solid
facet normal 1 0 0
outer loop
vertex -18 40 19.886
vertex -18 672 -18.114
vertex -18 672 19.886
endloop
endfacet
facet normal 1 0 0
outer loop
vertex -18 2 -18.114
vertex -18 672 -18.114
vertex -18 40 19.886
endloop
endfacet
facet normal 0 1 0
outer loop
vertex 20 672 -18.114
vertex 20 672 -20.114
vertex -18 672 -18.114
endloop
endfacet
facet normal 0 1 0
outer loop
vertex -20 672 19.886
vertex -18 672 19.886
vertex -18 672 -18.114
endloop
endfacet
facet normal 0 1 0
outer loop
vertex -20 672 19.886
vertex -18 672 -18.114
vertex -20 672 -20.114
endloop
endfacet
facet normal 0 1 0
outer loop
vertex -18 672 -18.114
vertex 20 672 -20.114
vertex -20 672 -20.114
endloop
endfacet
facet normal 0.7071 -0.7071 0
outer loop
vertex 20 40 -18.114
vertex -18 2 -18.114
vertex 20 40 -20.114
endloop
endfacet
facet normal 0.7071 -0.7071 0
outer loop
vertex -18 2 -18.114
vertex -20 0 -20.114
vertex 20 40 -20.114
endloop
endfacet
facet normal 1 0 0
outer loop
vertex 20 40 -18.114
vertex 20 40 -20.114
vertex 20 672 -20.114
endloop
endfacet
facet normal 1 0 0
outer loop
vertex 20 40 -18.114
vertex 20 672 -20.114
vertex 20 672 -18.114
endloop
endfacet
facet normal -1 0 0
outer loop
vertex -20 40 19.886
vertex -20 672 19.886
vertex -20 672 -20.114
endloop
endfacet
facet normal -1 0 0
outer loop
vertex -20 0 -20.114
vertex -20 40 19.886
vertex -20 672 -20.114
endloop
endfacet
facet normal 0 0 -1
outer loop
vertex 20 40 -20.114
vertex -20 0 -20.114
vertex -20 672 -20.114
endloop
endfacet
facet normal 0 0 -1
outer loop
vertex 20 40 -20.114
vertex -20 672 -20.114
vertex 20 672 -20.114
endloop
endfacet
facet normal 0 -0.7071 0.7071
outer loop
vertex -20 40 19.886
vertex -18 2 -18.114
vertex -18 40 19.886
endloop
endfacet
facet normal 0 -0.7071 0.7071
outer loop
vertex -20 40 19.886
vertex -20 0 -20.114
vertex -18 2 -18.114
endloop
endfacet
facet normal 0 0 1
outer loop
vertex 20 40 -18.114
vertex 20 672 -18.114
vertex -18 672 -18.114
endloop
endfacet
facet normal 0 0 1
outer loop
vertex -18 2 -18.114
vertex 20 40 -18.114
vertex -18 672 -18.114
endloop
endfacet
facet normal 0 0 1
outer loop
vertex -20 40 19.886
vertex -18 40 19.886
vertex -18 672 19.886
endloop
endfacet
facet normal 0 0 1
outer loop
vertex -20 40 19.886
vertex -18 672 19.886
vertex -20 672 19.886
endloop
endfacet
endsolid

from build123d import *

# Parameters (mm, degrees)
BOSS_EXTRU_1_DEPTH      = 672
ENL_V_MAT_EXTRU_1_DEPTH = 590
ENL_V_MAT_EXTRU_2_DEPTH = 590


with BuildPart() as part:
    # Esquisse1 → Boss.-Extru.1 (new body)
    with BuildSketch(Plane(origin=(0, 0, 0), x_dir=(1, 0, 0), z_dir=(0, 1, 0))):
        Polygon((-20, 20.113636364), (20, 20.113636364), (20, 18.113636364), (-18, 18.113636364), (-18, -19.886363636), (-20, -19.886363636), align=None)
    extrude(amount=BOSS_EXTRU_1_DEPTH)

    # Esquisse2 → Enlèv. mat.-Extru.1 (cut)
    with BuildSketch(Plane(origin=(0, 0, -20.113636364), x_dir=(-1, 0, 0), z_dir=(0, 0, -1))):
        Polygon((20, 0), (-20, 40), (-20, 0), align=None)
    extrude(amount=-ENL_V_MAT_EXTRU_1_DEPTH, mode=Mode.SUBTRACT)

    # Esquisse3 → Enlèv. mat.-Extru.2 (cut)
    with BuildSketch(Plane.ZY.offset(20)):
        Polygon((-20.113636364, 0), (19.886363636, 40), (19.886363636, 0), align=None)
    extrude(amount=-ENL_V_MAT_EXTRU_2_DEPTH, mode=Mode.SUBTRACT)


solid = part.part
